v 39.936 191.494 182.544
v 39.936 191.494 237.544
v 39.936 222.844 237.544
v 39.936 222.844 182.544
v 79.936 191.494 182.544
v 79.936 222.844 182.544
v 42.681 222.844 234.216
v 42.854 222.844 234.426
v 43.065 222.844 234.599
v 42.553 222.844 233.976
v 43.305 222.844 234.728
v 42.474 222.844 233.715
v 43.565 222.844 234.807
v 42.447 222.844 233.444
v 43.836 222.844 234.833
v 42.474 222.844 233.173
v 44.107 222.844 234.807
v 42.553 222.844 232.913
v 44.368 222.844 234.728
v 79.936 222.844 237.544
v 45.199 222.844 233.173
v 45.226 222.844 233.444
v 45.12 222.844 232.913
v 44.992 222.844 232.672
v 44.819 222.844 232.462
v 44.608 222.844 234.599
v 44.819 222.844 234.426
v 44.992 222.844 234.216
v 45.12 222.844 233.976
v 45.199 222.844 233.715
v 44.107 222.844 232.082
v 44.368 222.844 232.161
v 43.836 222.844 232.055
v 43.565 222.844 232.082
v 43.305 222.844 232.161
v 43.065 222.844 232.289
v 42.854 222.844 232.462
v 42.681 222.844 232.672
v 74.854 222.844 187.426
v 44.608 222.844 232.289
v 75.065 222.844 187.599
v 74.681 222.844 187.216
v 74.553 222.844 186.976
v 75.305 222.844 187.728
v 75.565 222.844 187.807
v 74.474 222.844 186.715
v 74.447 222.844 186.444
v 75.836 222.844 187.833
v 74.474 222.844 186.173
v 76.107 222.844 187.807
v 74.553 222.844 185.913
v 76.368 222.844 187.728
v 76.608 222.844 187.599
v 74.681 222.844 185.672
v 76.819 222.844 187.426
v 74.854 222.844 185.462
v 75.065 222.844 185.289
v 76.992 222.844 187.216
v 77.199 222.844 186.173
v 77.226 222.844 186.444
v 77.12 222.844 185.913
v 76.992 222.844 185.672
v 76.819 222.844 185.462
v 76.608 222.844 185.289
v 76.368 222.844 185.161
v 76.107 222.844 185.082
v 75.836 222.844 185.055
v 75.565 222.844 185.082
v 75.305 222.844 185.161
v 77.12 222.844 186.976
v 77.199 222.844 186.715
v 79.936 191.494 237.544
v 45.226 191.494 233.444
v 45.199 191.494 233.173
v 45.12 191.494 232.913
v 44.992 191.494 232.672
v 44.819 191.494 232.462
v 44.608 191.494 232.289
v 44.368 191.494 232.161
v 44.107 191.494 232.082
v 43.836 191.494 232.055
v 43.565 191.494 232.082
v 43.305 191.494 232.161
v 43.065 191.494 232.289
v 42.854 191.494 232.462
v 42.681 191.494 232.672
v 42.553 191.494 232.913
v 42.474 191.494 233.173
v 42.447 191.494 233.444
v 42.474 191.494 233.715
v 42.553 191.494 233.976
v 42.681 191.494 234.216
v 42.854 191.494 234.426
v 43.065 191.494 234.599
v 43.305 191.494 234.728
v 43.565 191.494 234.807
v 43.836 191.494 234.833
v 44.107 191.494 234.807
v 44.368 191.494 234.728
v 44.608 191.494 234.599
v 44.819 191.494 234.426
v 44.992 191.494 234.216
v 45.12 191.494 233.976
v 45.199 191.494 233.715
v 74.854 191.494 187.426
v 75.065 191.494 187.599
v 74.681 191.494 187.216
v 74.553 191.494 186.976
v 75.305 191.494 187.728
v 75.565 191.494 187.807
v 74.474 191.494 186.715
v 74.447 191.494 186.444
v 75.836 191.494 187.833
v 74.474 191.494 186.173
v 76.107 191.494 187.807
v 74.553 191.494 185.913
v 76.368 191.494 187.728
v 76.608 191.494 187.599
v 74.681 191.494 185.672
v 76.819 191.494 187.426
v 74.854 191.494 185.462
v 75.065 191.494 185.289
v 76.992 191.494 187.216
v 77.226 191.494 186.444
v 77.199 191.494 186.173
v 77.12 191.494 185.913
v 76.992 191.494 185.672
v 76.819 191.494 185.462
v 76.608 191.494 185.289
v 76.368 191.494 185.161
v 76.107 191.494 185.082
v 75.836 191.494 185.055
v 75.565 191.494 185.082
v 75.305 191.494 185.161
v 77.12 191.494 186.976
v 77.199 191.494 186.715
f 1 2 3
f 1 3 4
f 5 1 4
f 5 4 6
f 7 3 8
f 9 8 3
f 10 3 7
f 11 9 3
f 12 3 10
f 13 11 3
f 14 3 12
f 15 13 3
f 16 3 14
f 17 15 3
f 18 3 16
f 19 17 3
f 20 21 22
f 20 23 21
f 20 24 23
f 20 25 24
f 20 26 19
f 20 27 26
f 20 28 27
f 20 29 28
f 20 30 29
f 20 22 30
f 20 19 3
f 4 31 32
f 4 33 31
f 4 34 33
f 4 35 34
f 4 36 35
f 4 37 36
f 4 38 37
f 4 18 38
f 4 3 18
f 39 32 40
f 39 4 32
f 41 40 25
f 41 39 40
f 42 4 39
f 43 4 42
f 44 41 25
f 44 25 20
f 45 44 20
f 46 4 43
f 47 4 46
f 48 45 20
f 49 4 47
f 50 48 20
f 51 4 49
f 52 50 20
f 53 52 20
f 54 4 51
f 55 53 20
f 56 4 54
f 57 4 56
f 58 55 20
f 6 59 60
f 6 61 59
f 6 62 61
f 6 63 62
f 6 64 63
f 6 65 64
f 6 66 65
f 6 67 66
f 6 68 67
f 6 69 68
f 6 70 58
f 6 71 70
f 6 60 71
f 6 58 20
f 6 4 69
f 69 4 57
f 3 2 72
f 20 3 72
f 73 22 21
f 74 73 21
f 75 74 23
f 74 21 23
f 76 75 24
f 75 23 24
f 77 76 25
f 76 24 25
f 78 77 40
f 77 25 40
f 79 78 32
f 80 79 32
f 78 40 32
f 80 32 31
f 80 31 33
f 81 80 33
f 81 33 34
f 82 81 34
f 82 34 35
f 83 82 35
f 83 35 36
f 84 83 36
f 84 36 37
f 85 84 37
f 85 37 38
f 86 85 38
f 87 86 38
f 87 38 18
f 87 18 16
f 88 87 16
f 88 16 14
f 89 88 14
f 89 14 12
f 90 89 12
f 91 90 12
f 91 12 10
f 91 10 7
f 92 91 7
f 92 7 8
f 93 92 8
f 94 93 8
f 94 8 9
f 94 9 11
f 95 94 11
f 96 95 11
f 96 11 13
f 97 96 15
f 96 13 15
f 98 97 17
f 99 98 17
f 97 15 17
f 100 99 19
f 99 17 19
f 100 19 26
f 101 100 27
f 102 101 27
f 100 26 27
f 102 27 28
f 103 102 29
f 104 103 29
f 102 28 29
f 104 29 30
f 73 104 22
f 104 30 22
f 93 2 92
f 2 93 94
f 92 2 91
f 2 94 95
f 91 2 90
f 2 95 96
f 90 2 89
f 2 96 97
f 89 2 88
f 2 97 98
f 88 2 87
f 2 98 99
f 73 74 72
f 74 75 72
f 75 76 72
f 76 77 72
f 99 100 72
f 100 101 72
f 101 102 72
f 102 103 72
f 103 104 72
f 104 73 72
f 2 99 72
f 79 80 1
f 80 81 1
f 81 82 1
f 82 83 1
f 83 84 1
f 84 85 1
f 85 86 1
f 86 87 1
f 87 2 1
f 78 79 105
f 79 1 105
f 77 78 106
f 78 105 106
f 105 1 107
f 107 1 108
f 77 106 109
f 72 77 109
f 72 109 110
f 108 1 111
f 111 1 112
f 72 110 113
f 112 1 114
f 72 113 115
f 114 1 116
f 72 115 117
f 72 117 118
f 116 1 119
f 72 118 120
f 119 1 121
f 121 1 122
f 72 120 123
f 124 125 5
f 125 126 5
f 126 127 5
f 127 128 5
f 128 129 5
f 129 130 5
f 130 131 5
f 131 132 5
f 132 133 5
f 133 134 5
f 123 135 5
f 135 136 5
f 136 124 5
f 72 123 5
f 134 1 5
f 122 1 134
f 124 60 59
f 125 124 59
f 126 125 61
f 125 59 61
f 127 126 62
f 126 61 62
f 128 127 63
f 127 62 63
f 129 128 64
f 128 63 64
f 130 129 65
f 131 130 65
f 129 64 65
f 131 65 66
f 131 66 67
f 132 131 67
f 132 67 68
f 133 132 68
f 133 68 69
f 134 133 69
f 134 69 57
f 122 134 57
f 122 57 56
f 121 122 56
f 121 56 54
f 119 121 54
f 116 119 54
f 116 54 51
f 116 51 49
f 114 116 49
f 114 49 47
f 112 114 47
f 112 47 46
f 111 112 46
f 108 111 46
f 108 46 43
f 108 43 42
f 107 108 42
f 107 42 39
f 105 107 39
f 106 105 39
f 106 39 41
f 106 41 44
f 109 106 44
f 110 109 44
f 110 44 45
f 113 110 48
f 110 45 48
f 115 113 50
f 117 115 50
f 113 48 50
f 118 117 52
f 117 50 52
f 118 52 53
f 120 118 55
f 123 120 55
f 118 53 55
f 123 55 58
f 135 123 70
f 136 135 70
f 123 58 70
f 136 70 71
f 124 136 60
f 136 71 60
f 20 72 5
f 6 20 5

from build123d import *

# Parameters (mm, degrees)
BOSS_EXTRUDE1_START             = -14.3
SKETCH1_W                       = 40
SKETCH1_H                       = 55
BOSS_EXTRUDE1_DEPTH             = 31.35
F_7_64_0_10938_DIAMETER_HOLE1_D = 2.778252


with BuildPart() as part:
    # Sketch1 → Boss-Extrude1 (new body)
    with BuildSketch(Plane(origin=(0, 205.794413587, 0), x_dir=(1, 0, 0), z_dir=(0, 1, 0)).offset(BOSS_EXTRUDE1_START)):
        with Locations((59.936494412, -210.044134902)):
            Rectangle(SKETCH1_W, SKETCH1_H)
    extrude(amount=BOSS_EXTRUDE1_DEPTH)

    # 7/64 (0.10938) Diameter Hole1 (through all)
    with Locations(Plane(origin=(0, 191.494413587, 0), x_dir=(-1, 0, 0), z_dir=(0, -1, 0))):
        with Locations((-75.836494412, -186.444134902), (-43.836494412, -233.444134902)):
            Hole(F_7_64_0_10938_DIAMETER_HOLE1_D / 2)


solid = part.part
